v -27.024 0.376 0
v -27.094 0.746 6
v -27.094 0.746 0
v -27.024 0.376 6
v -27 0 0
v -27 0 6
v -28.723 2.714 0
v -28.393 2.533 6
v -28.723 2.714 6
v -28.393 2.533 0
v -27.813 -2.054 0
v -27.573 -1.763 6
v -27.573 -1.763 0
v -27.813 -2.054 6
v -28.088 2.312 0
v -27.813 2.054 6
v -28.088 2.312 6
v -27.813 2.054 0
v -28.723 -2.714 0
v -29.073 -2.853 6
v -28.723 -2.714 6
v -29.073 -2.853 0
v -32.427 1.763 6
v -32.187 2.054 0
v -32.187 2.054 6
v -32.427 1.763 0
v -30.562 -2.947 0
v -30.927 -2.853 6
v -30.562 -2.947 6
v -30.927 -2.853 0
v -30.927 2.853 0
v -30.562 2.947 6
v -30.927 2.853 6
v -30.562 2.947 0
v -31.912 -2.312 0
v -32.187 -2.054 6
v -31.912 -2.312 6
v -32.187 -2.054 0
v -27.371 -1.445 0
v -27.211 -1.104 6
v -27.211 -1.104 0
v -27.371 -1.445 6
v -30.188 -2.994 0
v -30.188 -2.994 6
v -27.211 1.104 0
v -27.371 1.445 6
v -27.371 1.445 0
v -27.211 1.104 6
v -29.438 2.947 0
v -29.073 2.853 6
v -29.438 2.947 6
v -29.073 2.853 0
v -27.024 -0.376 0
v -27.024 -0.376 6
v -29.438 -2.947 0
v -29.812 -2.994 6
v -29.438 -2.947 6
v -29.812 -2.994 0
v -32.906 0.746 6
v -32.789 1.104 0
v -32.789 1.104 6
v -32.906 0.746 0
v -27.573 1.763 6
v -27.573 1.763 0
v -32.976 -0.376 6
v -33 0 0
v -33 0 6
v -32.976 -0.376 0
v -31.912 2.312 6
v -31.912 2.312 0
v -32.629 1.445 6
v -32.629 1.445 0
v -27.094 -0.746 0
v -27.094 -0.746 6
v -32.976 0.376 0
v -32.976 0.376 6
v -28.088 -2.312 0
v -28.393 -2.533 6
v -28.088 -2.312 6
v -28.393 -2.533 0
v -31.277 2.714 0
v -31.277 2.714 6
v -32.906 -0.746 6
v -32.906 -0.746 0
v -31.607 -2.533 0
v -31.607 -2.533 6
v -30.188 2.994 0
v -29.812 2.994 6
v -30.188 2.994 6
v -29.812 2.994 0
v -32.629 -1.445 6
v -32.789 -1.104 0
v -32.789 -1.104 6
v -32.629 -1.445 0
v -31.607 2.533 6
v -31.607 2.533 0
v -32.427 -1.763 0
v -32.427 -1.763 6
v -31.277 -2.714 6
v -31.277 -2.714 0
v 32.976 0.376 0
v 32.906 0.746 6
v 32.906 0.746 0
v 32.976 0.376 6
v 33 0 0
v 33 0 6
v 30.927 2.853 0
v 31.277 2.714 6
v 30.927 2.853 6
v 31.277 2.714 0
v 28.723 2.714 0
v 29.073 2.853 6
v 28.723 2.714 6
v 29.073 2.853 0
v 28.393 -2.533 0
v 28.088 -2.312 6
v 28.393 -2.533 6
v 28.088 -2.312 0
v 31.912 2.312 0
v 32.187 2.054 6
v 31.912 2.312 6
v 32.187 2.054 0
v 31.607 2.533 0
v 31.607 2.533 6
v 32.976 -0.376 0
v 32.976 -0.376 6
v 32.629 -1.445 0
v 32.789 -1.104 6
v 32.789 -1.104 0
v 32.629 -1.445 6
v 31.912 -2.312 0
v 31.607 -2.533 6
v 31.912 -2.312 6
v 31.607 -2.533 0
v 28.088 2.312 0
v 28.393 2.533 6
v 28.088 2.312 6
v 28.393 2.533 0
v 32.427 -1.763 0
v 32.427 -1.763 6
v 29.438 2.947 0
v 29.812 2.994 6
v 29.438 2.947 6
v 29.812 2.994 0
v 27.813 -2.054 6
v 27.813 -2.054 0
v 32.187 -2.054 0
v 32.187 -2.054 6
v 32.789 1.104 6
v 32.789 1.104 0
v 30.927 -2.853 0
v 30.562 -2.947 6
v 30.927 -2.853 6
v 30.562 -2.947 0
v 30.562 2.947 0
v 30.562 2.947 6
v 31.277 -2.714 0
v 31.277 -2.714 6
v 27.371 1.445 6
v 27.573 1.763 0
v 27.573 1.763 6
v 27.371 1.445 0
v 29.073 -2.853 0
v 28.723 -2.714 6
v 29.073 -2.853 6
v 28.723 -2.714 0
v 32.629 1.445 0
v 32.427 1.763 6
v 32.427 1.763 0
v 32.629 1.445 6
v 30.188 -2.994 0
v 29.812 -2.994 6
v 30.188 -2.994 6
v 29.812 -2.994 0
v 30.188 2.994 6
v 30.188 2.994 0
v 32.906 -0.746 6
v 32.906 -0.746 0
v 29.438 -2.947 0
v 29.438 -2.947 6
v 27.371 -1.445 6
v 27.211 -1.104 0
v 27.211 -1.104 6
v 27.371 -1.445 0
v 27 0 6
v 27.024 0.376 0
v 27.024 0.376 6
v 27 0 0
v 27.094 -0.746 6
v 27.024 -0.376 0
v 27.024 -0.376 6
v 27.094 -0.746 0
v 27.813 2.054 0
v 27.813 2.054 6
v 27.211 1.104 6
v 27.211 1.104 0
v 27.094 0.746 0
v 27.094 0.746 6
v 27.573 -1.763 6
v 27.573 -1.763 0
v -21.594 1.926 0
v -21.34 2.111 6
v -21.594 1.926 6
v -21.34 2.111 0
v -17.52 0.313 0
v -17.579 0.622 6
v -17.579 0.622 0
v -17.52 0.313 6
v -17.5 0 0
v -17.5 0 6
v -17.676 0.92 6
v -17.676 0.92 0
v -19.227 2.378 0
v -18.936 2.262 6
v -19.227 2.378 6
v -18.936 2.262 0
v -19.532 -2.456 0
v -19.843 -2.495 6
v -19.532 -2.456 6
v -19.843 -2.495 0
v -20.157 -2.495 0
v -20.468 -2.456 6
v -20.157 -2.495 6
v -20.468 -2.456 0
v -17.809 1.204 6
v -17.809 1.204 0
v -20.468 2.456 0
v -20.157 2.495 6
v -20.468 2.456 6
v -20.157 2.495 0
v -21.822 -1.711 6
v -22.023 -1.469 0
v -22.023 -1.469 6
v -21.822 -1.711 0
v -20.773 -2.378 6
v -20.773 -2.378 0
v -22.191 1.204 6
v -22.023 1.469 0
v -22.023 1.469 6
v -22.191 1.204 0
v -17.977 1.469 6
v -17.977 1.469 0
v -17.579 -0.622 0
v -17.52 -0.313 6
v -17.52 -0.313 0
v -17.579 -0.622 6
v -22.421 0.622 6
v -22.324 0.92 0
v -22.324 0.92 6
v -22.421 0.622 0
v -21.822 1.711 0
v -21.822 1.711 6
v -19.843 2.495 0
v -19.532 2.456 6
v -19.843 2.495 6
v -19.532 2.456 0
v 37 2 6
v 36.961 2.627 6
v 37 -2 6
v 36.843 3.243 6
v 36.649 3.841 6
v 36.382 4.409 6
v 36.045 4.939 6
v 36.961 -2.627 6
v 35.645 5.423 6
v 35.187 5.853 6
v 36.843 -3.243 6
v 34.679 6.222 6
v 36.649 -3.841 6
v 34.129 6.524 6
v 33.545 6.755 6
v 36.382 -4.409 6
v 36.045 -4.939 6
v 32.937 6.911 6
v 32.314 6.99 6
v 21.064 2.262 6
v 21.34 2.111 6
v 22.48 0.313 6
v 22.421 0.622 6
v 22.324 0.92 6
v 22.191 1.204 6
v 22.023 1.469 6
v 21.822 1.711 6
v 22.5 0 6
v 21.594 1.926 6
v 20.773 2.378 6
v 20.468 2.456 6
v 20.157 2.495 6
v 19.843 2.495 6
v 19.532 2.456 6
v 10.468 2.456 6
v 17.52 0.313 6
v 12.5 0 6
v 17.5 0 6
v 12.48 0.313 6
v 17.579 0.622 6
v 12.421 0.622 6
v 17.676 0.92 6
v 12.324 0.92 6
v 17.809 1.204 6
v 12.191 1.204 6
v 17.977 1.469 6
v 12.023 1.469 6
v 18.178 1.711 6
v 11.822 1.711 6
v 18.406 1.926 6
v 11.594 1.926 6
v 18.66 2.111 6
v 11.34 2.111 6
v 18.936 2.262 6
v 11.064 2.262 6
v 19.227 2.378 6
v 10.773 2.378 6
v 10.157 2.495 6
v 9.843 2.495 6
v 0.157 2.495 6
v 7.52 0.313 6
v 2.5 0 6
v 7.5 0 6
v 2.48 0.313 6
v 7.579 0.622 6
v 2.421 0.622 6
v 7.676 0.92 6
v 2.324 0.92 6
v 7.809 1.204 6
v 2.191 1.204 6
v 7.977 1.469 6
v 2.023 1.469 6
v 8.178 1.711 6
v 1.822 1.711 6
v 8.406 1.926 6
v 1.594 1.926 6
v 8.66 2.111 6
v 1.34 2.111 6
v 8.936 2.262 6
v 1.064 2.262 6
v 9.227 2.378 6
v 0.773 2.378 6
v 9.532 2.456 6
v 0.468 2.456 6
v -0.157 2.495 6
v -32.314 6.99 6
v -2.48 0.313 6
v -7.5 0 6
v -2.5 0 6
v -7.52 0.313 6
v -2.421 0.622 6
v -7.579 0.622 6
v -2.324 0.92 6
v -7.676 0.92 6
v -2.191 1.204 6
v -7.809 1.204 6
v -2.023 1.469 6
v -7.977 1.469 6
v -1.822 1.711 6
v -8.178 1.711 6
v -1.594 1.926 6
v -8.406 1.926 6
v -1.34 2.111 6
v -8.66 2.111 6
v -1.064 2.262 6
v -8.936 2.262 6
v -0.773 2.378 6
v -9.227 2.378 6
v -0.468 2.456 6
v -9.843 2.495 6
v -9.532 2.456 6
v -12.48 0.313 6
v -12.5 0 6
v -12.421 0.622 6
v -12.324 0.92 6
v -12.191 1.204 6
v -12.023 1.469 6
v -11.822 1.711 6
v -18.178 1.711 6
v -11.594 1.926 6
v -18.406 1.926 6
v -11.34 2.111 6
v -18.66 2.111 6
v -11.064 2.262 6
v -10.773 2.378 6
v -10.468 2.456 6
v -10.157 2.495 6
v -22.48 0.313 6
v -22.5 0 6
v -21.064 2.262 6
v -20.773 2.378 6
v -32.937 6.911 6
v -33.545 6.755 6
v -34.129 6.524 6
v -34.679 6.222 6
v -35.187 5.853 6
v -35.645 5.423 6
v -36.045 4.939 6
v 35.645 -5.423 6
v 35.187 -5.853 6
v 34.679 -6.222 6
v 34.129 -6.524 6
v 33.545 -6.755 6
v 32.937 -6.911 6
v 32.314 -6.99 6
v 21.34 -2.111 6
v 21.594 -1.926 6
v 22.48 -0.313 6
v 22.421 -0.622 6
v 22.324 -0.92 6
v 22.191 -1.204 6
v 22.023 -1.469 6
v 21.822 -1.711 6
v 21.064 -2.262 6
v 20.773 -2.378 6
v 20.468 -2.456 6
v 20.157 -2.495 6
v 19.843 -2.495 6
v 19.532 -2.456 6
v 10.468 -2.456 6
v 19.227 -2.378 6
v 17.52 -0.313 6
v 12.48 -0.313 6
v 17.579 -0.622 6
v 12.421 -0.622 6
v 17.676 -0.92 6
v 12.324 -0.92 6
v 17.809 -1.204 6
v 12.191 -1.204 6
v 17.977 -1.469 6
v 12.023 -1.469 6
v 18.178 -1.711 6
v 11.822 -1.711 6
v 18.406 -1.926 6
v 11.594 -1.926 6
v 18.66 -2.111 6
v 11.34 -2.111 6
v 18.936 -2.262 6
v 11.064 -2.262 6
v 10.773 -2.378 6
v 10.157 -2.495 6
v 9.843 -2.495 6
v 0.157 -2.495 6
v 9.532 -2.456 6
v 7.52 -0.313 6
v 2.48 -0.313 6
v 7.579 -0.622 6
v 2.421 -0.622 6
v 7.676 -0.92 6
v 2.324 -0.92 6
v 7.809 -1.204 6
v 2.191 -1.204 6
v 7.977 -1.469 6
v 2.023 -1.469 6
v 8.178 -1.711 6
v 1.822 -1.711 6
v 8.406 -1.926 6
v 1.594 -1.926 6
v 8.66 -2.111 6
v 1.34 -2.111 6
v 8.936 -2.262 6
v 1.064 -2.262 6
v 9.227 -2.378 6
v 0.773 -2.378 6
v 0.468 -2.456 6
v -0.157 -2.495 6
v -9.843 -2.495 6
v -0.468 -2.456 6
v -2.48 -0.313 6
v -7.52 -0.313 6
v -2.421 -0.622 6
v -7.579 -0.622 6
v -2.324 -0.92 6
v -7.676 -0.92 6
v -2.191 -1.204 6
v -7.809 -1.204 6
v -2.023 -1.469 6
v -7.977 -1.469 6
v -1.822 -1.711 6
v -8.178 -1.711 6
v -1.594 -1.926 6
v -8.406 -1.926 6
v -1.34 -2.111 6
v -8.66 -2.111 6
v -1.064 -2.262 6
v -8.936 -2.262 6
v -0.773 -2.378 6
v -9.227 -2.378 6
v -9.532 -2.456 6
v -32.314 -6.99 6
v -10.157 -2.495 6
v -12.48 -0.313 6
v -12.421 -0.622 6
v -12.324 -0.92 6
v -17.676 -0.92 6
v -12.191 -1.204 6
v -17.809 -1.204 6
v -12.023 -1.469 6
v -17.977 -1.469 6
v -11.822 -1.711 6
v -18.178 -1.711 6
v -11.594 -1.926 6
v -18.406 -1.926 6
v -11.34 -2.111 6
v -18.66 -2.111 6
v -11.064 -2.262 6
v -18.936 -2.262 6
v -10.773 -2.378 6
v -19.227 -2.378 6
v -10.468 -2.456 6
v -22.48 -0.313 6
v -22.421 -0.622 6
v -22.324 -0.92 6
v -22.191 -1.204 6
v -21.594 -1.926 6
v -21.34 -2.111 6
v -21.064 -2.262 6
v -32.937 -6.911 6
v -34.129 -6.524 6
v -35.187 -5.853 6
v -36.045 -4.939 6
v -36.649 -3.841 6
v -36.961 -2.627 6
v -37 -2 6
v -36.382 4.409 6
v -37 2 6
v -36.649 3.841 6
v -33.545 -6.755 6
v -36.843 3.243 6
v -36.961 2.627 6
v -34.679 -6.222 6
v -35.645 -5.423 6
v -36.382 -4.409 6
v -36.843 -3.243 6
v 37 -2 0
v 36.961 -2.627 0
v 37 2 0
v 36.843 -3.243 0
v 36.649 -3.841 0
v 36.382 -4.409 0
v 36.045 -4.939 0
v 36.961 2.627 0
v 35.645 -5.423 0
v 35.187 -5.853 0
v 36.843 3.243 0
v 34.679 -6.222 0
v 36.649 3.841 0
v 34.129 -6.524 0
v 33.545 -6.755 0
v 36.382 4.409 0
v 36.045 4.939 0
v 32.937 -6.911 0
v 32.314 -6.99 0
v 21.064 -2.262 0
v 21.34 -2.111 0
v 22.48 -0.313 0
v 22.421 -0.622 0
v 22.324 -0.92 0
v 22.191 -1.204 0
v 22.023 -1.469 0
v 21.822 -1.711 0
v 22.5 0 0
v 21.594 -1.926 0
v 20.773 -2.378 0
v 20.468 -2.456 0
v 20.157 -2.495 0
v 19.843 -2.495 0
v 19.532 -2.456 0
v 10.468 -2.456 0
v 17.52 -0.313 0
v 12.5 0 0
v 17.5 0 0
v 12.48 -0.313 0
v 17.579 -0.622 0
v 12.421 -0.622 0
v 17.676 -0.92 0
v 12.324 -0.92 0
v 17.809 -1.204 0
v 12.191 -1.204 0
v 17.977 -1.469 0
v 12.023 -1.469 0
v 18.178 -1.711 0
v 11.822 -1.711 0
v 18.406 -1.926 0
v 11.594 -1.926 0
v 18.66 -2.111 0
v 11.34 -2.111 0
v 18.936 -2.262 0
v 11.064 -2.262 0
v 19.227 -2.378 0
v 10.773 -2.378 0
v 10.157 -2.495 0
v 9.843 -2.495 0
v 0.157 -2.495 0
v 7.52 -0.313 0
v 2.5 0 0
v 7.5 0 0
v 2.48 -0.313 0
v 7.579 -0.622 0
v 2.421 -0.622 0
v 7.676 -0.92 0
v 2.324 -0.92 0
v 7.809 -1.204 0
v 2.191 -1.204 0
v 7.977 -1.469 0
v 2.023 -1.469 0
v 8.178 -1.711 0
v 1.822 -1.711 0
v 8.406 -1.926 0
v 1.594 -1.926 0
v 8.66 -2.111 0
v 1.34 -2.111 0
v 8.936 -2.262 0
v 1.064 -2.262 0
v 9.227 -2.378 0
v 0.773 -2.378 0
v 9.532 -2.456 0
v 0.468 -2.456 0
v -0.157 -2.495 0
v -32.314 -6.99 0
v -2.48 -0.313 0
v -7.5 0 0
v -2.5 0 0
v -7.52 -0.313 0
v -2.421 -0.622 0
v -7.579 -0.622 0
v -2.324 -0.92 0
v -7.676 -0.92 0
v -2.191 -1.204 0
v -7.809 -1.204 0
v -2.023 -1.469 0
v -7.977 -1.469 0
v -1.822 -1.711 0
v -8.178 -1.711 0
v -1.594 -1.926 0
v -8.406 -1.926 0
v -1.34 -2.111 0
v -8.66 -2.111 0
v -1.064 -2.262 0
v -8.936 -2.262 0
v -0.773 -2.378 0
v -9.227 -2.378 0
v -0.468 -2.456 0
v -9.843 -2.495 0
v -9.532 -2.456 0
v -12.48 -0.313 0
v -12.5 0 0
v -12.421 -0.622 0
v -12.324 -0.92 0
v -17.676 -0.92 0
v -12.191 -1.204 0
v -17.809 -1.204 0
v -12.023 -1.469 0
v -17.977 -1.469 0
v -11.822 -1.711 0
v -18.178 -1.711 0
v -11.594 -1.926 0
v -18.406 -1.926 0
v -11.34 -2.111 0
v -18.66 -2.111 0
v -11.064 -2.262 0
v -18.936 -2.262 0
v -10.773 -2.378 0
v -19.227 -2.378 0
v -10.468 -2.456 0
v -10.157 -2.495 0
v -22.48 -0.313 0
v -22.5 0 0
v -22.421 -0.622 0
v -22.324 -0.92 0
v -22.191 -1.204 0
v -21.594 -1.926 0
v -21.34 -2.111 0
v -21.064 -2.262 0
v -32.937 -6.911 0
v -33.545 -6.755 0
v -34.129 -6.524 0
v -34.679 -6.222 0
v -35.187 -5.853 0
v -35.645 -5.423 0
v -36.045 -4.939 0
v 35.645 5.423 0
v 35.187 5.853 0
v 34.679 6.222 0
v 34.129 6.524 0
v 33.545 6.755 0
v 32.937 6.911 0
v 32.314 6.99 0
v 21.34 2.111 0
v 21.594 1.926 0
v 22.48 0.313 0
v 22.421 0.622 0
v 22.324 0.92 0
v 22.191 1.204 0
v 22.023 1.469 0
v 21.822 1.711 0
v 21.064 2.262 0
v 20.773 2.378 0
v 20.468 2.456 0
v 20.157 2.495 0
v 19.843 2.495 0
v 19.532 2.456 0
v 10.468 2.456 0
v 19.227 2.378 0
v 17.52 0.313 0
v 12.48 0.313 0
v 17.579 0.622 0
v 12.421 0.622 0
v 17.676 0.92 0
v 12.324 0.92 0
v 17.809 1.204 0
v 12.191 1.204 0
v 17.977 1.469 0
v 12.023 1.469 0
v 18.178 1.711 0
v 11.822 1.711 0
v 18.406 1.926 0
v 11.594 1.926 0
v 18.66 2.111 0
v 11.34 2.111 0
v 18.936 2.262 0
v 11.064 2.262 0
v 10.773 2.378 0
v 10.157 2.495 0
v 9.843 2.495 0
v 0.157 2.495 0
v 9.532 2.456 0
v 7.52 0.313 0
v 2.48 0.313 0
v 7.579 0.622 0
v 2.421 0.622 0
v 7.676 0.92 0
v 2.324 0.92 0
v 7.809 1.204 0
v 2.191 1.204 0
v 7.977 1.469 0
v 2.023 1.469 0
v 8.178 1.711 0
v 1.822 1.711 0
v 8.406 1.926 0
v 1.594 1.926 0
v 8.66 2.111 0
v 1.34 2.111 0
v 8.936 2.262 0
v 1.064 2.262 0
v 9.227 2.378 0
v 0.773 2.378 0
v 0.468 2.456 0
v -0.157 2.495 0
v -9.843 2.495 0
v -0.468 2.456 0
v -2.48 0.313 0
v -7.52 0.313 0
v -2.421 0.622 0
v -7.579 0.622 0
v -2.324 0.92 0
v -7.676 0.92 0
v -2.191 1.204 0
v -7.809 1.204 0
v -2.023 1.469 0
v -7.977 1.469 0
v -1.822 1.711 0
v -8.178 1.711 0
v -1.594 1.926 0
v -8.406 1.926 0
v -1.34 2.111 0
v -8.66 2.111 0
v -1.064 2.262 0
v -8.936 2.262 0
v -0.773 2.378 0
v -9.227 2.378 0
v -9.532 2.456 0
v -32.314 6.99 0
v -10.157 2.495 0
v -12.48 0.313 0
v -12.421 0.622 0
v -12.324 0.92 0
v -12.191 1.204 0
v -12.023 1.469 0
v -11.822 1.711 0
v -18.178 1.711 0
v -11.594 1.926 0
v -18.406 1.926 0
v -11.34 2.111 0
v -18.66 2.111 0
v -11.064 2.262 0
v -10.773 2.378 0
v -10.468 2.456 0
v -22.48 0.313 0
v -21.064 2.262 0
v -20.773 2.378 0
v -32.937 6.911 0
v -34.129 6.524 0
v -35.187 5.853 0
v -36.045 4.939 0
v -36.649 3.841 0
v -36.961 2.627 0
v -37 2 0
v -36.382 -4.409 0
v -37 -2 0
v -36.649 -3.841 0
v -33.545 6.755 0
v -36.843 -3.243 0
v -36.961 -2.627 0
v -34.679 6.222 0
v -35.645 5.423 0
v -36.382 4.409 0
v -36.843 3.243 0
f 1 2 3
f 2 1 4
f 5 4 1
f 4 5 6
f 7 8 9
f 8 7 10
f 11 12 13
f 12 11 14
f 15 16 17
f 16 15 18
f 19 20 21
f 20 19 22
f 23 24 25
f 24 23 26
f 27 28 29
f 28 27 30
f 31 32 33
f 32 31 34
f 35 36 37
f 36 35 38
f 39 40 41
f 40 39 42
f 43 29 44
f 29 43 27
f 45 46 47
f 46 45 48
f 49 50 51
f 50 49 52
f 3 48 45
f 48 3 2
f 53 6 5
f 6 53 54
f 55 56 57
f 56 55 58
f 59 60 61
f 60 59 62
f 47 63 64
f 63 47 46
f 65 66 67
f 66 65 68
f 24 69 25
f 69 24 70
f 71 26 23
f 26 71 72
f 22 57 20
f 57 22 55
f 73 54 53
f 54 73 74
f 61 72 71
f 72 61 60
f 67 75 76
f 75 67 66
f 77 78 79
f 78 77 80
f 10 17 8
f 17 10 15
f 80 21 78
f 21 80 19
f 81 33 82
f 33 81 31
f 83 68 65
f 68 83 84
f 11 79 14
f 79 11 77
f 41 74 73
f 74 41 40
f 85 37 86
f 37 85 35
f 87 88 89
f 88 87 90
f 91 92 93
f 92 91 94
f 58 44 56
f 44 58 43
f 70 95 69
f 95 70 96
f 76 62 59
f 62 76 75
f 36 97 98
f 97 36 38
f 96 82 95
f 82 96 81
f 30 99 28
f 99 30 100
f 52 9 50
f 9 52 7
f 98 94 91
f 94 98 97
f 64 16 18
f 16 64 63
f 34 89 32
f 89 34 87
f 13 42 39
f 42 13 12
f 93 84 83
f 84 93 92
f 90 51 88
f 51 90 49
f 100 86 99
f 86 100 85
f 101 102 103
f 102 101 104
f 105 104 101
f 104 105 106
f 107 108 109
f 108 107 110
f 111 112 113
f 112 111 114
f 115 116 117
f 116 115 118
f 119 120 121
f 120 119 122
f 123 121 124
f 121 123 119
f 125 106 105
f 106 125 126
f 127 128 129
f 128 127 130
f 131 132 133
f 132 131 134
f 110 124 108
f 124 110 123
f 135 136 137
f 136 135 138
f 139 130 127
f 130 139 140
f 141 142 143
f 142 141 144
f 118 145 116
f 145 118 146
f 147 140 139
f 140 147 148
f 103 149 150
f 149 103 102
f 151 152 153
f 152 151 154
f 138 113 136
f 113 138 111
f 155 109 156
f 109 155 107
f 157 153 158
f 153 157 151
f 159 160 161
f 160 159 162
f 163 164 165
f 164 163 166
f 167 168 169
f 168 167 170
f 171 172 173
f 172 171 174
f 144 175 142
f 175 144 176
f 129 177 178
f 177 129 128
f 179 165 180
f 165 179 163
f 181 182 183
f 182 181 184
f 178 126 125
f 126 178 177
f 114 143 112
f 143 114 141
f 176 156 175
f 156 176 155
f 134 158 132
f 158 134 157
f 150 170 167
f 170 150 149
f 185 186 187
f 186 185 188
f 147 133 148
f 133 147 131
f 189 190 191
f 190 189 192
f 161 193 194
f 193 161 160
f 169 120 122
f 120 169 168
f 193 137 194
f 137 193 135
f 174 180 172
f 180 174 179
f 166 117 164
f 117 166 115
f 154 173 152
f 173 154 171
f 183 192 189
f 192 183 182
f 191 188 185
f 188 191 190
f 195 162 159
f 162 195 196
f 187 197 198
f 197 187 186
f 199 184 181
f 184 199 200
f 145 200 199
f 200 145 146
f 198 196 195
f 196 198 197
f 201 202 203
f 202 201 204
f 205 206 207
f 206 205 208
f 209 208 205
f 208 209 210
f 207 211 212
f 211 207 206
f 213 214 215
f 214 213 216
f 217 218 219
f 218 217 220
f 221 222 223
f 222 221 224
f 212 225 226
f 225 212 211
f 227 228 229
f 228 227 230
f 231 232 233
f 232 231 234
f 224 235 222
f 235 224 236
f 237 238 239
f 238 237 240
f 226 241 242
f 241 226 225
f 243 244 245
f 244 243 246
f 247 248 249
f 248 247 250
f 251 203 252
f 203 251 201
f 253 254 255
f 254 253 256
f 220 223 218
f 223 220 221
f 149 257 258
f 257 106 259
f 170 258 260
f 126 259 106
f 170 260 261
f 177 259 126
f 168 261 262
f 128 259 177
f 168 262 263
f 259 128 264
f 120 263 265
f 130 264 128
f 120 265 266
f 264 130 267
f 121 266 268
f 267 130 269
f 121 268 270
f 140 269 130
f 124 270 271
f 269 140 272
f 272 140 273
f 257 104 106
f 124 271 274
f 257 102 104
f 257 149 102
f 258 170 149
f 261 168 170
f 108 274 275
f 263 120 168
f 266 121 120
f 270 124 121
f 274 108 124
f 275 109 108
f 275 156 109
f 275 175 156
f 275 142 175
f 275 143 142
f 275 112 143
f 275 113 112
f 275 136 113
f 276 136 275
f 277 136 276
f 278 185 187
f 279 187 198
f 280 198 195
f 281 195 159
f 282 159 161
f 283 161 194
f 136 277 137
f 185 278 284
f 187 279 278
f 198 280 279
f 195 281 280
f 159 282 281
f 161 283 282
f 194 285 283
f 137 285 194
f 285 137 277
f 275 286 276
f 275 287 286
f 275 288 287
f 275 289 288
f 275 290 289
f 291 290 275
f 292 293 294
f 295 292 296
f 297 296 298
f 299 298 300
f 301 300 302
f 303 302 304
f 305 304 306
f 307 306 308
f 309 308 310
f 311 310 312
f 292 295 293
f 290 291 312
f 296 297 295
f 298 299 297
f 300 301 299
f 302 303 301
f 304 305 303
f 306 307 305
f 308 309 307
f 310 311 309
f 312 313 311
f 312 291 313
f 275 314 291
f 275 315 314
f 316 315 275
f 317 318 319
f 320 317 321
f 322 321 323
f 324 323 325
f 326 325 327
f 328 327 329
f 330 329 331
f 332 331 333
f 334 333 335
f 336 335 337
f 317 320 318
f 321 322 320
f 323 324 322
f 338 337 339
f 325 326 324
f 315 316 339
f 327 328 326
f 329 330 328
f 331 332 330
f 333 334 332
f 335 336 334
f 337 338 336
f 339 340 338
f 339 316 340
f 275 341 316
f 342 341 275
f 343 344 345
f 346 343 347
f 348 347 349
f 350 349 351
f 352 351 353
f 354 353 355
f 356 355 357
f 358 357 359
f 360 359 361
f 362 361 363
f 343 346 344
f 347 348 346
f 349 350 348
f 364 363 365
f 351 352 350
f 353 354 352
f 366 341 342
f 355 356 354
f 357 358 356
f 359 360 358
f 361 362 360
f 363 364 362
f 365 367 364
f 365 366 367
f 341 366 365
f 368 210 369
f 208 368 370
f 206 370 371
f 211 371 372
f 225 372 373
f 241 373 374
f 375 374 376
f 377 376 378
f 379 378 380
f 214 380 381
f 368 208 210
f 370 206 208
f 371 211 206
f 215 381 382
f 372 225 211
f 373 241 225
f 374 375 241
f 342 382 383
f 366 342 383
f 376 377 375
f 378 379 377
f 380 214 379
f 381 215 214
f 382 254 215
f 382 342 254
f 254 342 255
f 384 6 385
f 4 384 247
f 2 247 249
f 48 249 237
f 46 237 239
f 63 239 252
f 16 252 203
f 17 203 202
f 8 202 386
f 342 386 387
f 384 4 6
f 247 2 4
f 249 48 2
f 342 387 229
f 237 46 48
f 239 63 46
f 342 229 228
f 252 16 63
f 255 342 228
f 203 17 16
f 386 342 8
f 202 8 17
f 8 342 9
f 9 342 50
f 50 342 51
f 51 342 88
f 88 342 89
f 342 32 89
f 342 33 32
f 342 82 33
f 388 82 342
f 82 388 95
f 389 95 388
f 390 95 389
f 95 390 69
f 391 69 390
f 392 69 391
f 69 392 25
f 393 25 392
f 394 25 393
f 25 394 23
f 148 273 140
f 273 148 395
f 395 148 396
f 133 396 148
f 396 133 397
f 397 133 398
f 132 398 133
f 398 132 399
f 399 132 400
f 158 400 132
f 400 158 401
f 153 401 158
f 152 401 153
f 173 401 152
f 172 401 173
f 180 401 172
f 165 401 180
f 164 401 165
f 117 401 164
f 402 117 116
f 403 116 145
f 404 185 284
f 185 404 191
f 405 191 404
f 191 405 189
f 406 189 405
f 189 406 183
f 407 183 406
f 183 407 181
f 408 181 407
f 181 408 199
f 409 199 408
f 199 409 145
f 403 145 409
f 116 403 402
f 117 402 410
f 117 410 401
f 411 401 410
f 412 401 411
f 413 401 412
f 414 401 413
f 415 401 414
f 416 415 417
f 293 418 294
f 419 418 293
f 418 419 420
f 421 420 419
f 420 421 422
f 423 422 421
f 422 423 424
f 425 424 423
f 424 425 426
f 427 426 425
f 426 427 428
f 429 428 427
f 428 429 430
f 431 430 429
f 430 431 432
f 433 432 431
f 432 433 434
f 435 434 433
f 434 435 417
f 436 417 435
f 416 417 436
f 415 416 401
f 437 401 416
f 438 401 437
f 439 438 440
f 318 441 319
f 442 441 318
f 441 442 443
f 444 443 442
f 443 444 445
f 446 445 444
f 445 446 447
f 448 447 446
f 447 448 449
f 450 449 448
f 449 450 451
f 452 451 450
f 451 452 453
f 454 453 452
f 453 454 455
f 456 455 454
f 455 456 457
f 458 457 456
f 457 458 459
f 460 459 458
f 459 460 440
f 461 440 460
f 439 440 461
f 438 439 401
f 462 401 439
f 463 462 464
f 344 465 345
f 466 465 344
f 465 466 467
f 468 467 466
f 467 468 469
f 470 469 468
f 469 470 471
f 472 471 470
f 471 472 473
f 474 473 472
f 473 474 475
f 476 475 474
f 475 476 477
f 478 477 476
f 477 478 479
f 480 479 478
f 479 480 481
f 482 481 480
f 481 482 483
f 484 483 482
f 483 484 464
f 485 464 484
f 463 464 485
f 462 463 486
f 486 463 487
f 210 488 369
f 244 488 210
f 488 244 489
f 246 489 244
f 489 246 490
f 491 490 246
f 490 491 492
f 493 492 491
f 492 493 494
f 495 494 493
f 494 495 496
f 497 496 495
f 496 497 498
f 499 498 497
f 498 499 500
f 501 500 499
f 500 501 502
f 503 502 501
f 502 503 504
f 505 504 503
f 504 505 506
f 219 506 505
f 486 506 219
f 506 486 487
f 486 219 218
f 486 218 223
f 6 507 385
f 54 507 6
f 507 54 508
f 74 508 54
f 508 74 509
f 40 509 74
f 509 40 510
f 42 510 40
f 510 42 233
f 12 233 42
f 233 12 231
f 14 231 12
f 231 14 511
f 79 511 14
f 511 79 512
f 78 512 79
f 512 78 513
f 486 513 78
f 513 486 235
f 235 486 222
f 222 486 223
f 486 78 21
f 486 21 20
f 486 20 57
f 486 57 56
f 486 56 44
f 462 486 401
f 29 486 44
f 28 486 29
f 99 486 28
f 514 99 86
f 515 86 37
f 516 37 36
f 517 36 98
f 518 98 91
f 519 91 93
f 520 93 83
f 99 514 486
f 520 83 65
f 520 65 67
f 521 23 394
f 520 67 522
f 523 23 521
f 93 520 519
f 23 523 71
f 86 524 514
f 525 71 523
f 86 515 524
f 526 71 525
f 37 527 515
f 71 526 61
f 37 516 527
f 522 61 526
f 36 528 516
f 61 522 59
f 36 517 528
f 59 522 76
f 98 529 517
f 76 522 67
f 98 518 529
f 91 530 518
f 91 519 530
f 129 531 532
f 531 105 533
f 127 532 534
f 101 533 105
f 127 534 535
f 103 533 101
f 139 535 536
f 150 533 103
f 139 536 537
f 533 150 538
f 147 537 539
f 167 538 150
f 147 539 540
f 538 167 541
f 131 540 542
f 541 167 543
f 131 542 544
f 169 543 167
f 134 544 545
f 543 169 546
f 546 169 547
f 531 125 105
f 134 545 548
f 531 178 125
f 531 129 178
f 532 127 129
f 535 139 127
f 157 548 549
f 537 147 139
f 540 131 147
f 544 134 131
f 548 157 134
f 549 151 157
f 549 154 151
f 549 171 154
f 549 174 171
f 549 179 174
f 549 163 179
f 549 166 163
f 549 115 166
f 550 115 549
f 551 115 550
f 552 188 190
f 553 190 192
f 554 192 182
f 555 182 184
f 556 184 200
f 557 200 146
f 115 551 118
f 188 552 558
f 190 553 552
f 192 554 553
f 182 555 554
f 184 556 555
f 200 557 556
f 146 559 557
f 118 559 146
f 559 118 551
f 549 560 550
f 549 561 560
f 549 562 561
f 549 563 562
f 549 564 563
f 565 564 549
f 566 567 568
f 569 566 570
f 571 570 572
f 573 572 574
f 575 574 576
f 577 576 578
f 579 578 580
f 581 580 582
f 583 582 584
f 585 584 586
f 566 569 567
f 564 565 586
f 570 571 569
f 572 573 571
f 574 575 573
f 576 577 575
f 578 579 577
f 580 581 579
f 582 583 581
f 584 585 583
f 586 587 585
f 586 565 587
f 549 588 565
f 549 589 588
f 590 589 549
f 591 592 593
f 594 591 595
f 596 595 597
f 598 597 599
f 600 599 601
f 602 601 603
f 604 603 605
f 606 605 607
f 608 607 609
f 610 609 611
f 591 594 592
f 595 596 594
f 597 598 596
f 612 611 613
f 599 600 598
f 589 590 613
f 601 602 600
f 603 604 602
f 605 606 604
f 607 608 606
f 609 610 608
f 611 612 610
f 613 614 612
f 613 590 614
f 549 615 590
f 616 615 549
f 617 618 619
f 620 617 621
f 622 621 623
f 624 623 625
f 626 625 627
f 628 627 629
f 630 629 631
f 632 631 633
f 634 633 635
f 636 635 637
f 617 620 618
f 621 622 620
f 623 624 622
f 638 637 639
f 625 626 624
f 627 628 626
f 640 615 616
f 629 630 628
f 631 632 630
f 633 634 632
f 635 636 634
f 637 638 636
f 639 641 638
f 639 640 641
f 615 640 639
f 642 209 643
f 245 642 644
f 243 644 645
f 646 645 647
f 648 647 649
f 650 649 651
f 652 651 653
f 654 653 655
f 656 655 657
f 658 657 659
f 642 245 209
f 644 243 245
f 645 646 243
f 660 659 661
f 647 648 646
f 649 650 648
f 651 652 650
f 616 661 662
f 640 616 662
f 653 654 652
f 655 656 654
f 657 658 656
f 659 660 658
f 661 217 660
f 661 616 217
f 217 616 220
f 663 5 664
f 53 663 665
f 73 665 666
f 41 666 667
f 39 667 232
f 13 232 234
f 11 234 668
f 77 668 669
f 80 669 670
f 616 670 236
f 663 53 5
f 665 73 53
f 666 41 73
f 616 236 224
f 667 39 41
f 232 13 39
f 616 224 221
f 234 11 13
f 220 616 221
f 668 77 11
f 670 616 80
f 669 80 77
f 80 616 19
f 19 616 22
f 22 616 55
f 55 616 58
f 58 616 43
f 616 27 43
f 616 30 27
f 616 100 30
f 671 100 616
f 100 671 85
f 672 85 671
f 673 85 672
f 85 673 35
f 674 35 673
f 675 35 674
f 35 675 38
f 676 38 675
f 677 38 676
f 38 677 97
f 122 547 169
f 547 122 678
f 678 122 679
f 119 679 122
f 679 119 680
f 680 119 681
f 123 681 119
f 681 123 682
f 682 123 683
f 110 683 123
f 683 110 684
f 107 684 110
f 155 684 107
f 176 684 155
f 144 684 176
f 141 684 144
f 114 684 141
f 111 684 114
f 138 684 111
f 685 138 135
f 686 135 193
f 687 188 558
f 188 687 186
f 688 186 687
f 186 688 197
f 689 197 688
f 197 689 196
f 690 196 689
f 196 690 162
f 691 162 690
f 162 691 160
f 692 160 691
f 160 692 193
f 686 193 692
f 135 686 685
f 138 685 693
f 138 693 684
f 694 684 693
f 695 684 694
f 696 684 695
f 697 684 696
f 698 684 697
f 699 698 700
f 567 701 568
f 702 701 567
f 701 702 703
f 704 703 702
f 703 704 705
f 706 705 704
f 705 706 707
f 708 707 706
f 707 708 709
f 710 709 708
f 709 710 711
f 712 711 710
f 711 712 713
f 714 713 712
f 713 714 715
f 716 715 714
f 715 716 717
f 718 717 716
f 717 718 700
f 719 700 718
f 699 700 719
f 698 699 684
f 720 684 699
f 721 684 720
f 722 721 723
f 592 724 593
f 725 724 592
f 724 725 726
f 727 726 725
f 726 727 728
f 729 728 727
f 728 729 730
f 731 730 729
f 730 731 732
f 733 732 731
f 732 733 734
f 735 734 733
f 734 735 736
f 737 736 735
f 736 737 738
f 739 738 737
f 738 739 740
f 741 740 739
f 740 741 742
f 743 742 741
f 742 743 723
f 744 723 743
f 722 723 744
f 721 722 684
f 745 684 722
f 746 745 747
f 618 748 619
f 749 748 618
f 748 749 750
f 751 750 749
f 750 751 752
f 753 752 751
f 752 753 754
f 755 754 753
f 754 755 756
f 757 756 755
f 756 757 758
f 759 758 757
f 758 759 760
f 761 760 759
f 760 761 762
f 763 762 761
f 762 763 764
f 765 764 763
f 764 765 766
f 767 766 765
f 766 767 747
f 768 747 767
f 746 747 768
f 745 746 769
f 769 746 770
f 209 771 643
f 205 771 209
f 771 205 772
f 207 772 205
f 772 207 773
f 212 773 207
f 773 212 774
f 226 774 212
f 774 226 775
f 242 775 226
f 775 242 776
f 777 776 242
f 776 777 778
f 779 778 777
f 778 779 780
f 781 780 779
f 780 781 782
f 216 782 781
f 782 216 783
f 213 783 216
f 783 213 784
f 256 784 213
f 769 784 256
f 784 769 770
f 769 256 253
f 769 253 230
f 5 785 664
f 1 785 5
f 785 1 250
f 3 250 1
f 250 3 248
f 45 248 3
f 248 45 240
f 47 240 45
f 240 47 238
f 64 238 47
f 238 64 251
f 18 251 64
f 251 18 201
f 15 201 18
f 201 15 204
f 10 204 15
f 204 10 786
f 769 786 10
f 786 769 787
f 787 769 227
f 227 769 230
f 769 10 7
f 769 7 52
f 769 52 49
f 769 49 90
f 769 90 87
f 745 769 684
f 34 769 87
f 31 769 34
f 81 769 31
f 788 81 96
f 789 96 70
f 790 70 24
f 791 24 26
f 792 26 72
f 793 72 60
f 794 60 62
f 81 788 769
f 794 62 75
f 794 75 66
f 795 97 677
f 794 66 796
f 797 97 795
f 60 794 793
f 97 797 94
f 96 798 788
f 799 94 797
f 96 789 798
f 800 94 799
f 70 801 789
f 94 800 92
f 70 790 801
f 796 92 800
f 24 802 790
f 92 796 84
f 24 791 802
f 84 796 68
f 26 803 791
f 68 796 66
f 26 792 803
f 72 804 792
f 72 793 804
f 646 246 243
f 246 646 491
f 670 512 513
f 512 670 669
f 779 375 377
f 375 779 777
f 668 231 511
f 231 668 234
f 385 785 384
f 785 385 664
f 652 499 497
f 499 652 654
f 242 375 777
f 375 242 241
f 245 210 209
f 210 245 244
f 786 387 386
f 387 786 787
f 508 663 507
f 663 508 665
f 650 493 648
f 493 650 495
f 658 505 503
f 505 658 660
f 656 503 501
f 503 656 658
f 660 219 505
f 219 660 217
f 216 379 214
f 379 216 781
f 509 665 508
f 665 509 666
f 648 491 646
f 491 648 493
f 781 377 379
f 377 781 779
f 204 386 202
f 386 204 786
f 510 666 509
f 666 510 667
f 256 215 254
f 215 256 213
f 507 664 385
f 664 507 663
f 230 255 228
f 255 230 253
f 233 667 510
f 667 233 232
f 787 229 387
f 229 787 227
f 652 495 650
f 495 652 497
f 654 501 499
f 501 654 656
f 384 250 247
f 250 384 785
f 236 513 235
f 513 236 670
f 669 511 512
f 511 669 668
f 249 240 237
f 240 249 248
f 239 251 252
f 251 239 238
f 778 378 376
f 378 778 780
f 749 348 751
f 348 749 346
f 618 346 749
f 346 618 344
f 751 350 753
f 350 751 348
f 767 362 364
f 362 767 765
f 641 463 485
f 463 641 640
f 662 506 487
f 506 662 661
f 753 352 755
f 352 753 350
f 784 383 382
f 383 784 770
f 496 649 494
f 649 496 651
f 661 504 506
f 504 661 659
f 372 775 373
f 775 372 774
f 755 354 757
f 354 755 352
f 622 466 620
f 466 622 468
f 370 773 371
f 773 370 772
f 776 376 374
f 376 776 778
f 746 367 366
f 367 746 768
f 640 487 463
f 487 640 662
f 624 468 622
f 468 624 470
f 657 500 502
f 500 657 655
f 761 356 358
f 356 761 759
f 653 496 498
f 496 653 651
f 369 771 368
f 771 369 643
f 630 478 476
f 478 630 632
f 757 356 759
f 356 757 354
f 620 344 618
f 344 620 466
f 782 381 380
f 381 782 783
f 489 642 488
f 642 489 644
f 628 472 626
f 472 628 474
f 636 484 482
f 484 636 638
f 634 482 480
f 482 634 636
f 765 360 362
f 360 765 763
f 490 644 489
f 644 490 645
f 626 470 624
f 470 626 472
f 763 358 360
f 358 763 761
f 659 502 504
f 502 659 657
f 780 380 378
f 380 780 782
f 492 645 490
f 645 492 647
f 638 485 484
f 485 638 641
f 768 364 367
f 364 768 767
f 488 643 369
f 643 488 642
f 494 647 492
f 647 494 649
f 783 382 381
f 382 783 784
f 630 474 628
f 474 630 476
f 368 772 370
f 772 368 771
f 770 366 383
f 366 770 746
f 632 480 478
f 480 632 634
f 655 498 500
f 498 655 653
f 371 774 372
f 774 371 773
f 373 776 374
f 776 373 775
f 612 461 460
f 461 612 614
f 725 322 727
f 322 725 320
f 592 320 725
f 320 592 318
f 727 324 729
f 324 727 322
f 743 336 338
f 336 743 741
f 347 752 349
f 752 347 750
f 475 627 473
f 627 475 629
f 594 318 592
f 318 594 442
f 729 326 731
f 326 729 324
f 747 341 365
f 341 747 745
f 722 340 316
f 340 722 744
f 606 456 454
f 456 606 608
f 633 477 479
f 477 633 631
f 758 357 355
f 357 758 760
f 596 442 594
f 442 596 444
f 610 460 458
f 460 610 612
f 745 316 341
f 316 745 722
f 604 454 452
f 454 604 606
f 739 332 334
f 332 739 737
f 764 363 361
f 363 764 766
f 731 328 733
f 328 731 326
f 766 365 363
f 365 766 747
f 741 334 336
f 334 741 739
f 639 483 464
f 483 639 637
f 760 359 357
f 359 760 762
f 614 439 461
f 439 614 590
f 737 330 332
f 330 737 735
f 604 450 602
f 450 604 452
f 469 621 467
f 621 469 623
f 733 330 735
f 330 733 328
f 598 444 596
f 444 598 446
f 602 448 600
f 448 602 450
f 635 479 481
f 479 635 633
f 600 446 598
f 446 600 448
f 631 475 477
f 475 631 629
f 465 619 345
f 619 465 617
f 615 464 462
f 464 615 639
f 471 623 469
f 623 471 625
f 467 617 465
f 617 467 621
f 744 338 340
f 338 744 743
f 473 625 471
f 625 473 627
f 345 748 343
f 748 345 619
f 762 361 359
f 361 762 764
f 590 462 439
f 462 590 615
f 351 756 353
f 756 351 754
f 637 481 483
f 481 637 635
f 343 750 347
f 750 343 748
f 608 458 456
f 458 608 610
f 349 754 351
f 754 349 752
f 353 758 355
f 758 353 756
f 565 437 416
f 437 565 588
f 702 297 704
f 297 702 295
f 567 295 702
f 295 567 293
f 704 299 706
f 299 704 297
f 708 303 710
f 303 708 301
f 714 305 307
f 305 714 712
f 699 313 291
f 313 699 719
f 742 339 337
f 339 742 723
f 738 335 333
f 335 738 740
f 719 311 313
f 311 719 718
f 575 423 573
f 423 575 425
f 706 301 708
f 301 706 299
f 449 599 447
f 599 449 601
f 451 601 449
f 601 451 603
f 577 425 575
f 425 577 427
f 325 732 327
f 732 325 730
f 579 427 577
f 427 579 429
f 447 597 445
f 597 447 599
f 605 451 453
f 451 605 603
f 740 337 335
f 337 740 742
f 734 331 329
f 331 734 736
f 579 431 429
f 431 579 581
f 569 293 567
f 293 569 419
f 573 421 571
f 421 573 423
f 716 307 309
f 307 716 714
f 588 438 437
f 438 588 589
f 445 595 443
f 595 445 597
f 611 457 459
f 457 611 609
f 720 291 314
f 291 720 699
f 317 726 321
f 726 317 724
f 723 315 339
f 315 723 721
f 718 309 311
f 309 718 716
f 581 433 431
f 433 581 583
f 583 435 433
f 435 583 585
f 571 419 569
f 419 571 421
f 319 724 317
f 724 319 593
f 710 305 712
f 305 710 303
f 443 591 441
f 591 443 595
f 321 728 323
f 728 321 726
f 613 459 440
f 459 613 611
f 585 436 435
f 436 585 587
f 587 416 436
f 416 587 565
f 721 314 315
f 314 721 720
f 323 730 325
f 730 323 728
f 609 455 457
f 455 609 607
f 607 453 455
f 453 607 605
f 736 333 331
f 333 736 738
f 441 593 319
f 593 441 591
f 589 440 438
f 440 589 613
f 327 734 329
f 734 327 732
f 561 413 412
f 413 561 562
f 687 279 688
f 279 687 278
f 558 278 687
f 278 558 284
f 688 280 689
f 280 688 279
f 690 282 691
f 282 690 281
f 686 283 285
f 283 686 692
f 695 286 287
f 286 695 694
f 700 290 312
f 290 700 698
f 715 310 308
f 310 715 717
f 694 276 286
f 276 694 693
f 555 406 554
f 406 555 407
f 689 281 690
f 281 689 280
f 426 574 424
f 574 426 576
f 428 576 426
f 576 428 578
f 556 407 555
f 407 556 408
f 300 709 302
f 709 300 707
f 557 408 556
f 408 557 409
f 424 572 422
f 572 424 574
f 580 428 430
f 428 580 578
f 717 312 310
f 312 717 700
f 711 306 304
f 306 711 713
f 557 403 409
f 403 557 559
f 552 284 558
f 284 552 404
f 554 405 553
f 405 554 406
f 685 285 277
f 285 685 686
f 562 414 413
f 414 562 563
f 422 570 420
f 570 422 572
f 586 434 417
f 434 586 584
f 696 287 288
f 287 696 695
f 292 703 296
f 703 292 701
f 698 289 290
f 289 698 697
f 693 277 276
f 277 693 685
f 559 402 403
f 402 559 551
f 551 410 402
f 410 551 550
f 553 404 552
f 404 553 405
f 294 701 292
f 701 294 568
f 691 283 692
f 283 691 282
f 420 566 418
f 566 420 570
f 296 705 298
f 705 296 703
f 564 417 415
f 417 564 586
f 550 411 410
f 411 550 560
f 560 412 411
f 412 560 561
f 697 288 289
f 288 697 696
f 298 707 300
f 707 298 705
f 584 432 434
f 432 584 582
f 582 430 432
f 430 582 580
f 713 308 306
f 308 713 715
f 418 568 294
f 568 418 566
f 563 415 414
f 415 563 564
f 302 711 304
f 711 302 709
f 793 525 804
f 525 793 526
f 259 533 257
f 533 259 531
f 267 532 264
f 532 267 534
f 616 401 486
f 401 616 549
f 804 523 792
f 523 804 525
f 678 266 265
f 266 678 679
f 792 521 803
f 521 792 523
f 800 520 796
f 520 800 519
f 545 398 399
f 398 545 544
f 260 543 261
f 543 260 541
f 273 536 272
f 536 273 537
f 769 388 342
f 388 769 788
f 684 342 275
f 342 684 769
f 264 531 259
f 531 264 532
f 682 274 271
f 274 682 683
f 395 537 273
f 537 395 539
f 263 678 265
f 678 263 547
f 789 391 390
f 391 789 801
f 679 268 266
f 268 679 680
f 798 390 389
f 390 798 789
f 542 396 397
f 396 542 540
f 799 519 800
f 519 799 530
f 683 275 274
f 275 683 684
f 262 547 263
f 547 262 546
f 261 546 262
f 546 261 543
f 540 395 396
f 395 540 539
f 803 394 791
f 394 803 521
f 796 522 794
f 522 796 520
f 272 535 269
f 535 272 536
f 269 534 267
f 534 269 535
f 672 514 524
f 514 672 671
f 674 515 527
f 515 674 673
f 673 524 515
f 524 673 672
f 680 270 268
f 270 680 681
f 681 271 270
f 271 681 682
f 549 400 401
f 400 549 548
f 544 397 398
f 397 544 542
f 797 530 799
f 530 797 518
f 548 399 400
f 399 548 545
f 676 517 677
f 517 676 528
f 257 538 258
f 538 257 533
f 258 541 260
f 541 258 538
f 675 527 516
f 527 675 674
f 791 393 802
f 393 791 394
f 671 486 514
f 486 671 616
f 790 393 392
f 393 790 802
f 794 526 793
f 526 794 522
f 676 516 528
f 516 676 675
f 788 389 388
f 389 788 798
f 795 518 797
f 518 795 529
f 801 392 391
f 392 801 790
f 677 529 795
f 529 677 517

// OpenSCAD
$fn = 50;


difference() {
	union() {
		hull() {
			translate(v = [-32.0000000000, 2.0000000000, 0]) {
				cylinder(h = 6, r = 5);
			}
			translate(v = [32.0000000000, 2.0000000000, 0]) {
				cylinder(h = 6, r = 5);
			}
			translate(v = [-32.0000000000, -2.0000000000, 0]) {
				cylinder(h = 6, r = 5);
			}
			translate(v = [32.0000000000, -2.0000000000, 0]) {
				cylinder(h = 6, r = 5);
			}
		}
	}
	union() {
		#translate(v = [-30.0000000000, 0.0000000000, 0]) {
			cylinder(h = 6, r = 3.0000000000);
		}
		#translate(v = [30.0000000000, 0.0000000000, 0]) {
			cylinder(h = 6, r = 3.0000000000);
		}
		#translate(v = [-30.0000000000, 0.0000000000, -100.0000000000]) {
			cylinder(h = 200, r = 3.0000000000);
		}
		#translate(v = [-30.0000000000, 0.0000000000, -100.0000000000]) {
			cylinder(h = 200, r = 3.0000000000);
		}
		#translate(v = [30.0000000000, 0.0000000000, -100.0000000000]) {
			cylinder(h = 200, r = 3.0000000000);
		}
		#translate(v = [30.0000000000, 0.0000000000, -100.0000000000]) {
			cylinder(h = 200, r = 3.0000000000);
		}
		#translate(v = [-30.0000000000, 0.0000000000, 0]) {
			cylinder(h = 6, r = 1.5000000000);
		}
		#translate(v = [30.0000000000, 0.0000000000, 0]) {
			cylinder(h = 6, r = 1.5000000000);
		}
		#translate(v = [-30.0000000000, 0.0000000000, 0]) {
			cylinder(h = 6, r = 1.5000000000);
		}
		#translate(v = [30.0000000000, 0.0000000000, 0]) {
			cylinder(h = 6, r = 1.5000000000);
		}
		#translate(v = [-30.0000000000, 0.0000000000, 0]) {
			cylinder(h = 6, r = 1.5000000000);
		}
		#translate(v = [30.0000000000, 0.0000000000, 0]) {
			cylinder(h = 6, r = 1.5000000000);
		}
		#translate(v = [-20.0000000000, 0, 0]) {
			cylinder(h = 6, r = 2.5000000000);
		}
		#translate(v = [-10.0000000000, 0, 0]) {
			cylinder(h = 6, r = 2.5000000000);
		}
		#cylinder(h = 6, r = 2.5000000000);
		#translate(v = [10.0000000000, 0, 0]) {
			cylinder(h = 6, r = 2.5000000000);
		}
		#translate(v = [20.0000000000, 0, 0]) {
			cylinder(h = 6, r = 2.5000000000);
		}
	}
}
